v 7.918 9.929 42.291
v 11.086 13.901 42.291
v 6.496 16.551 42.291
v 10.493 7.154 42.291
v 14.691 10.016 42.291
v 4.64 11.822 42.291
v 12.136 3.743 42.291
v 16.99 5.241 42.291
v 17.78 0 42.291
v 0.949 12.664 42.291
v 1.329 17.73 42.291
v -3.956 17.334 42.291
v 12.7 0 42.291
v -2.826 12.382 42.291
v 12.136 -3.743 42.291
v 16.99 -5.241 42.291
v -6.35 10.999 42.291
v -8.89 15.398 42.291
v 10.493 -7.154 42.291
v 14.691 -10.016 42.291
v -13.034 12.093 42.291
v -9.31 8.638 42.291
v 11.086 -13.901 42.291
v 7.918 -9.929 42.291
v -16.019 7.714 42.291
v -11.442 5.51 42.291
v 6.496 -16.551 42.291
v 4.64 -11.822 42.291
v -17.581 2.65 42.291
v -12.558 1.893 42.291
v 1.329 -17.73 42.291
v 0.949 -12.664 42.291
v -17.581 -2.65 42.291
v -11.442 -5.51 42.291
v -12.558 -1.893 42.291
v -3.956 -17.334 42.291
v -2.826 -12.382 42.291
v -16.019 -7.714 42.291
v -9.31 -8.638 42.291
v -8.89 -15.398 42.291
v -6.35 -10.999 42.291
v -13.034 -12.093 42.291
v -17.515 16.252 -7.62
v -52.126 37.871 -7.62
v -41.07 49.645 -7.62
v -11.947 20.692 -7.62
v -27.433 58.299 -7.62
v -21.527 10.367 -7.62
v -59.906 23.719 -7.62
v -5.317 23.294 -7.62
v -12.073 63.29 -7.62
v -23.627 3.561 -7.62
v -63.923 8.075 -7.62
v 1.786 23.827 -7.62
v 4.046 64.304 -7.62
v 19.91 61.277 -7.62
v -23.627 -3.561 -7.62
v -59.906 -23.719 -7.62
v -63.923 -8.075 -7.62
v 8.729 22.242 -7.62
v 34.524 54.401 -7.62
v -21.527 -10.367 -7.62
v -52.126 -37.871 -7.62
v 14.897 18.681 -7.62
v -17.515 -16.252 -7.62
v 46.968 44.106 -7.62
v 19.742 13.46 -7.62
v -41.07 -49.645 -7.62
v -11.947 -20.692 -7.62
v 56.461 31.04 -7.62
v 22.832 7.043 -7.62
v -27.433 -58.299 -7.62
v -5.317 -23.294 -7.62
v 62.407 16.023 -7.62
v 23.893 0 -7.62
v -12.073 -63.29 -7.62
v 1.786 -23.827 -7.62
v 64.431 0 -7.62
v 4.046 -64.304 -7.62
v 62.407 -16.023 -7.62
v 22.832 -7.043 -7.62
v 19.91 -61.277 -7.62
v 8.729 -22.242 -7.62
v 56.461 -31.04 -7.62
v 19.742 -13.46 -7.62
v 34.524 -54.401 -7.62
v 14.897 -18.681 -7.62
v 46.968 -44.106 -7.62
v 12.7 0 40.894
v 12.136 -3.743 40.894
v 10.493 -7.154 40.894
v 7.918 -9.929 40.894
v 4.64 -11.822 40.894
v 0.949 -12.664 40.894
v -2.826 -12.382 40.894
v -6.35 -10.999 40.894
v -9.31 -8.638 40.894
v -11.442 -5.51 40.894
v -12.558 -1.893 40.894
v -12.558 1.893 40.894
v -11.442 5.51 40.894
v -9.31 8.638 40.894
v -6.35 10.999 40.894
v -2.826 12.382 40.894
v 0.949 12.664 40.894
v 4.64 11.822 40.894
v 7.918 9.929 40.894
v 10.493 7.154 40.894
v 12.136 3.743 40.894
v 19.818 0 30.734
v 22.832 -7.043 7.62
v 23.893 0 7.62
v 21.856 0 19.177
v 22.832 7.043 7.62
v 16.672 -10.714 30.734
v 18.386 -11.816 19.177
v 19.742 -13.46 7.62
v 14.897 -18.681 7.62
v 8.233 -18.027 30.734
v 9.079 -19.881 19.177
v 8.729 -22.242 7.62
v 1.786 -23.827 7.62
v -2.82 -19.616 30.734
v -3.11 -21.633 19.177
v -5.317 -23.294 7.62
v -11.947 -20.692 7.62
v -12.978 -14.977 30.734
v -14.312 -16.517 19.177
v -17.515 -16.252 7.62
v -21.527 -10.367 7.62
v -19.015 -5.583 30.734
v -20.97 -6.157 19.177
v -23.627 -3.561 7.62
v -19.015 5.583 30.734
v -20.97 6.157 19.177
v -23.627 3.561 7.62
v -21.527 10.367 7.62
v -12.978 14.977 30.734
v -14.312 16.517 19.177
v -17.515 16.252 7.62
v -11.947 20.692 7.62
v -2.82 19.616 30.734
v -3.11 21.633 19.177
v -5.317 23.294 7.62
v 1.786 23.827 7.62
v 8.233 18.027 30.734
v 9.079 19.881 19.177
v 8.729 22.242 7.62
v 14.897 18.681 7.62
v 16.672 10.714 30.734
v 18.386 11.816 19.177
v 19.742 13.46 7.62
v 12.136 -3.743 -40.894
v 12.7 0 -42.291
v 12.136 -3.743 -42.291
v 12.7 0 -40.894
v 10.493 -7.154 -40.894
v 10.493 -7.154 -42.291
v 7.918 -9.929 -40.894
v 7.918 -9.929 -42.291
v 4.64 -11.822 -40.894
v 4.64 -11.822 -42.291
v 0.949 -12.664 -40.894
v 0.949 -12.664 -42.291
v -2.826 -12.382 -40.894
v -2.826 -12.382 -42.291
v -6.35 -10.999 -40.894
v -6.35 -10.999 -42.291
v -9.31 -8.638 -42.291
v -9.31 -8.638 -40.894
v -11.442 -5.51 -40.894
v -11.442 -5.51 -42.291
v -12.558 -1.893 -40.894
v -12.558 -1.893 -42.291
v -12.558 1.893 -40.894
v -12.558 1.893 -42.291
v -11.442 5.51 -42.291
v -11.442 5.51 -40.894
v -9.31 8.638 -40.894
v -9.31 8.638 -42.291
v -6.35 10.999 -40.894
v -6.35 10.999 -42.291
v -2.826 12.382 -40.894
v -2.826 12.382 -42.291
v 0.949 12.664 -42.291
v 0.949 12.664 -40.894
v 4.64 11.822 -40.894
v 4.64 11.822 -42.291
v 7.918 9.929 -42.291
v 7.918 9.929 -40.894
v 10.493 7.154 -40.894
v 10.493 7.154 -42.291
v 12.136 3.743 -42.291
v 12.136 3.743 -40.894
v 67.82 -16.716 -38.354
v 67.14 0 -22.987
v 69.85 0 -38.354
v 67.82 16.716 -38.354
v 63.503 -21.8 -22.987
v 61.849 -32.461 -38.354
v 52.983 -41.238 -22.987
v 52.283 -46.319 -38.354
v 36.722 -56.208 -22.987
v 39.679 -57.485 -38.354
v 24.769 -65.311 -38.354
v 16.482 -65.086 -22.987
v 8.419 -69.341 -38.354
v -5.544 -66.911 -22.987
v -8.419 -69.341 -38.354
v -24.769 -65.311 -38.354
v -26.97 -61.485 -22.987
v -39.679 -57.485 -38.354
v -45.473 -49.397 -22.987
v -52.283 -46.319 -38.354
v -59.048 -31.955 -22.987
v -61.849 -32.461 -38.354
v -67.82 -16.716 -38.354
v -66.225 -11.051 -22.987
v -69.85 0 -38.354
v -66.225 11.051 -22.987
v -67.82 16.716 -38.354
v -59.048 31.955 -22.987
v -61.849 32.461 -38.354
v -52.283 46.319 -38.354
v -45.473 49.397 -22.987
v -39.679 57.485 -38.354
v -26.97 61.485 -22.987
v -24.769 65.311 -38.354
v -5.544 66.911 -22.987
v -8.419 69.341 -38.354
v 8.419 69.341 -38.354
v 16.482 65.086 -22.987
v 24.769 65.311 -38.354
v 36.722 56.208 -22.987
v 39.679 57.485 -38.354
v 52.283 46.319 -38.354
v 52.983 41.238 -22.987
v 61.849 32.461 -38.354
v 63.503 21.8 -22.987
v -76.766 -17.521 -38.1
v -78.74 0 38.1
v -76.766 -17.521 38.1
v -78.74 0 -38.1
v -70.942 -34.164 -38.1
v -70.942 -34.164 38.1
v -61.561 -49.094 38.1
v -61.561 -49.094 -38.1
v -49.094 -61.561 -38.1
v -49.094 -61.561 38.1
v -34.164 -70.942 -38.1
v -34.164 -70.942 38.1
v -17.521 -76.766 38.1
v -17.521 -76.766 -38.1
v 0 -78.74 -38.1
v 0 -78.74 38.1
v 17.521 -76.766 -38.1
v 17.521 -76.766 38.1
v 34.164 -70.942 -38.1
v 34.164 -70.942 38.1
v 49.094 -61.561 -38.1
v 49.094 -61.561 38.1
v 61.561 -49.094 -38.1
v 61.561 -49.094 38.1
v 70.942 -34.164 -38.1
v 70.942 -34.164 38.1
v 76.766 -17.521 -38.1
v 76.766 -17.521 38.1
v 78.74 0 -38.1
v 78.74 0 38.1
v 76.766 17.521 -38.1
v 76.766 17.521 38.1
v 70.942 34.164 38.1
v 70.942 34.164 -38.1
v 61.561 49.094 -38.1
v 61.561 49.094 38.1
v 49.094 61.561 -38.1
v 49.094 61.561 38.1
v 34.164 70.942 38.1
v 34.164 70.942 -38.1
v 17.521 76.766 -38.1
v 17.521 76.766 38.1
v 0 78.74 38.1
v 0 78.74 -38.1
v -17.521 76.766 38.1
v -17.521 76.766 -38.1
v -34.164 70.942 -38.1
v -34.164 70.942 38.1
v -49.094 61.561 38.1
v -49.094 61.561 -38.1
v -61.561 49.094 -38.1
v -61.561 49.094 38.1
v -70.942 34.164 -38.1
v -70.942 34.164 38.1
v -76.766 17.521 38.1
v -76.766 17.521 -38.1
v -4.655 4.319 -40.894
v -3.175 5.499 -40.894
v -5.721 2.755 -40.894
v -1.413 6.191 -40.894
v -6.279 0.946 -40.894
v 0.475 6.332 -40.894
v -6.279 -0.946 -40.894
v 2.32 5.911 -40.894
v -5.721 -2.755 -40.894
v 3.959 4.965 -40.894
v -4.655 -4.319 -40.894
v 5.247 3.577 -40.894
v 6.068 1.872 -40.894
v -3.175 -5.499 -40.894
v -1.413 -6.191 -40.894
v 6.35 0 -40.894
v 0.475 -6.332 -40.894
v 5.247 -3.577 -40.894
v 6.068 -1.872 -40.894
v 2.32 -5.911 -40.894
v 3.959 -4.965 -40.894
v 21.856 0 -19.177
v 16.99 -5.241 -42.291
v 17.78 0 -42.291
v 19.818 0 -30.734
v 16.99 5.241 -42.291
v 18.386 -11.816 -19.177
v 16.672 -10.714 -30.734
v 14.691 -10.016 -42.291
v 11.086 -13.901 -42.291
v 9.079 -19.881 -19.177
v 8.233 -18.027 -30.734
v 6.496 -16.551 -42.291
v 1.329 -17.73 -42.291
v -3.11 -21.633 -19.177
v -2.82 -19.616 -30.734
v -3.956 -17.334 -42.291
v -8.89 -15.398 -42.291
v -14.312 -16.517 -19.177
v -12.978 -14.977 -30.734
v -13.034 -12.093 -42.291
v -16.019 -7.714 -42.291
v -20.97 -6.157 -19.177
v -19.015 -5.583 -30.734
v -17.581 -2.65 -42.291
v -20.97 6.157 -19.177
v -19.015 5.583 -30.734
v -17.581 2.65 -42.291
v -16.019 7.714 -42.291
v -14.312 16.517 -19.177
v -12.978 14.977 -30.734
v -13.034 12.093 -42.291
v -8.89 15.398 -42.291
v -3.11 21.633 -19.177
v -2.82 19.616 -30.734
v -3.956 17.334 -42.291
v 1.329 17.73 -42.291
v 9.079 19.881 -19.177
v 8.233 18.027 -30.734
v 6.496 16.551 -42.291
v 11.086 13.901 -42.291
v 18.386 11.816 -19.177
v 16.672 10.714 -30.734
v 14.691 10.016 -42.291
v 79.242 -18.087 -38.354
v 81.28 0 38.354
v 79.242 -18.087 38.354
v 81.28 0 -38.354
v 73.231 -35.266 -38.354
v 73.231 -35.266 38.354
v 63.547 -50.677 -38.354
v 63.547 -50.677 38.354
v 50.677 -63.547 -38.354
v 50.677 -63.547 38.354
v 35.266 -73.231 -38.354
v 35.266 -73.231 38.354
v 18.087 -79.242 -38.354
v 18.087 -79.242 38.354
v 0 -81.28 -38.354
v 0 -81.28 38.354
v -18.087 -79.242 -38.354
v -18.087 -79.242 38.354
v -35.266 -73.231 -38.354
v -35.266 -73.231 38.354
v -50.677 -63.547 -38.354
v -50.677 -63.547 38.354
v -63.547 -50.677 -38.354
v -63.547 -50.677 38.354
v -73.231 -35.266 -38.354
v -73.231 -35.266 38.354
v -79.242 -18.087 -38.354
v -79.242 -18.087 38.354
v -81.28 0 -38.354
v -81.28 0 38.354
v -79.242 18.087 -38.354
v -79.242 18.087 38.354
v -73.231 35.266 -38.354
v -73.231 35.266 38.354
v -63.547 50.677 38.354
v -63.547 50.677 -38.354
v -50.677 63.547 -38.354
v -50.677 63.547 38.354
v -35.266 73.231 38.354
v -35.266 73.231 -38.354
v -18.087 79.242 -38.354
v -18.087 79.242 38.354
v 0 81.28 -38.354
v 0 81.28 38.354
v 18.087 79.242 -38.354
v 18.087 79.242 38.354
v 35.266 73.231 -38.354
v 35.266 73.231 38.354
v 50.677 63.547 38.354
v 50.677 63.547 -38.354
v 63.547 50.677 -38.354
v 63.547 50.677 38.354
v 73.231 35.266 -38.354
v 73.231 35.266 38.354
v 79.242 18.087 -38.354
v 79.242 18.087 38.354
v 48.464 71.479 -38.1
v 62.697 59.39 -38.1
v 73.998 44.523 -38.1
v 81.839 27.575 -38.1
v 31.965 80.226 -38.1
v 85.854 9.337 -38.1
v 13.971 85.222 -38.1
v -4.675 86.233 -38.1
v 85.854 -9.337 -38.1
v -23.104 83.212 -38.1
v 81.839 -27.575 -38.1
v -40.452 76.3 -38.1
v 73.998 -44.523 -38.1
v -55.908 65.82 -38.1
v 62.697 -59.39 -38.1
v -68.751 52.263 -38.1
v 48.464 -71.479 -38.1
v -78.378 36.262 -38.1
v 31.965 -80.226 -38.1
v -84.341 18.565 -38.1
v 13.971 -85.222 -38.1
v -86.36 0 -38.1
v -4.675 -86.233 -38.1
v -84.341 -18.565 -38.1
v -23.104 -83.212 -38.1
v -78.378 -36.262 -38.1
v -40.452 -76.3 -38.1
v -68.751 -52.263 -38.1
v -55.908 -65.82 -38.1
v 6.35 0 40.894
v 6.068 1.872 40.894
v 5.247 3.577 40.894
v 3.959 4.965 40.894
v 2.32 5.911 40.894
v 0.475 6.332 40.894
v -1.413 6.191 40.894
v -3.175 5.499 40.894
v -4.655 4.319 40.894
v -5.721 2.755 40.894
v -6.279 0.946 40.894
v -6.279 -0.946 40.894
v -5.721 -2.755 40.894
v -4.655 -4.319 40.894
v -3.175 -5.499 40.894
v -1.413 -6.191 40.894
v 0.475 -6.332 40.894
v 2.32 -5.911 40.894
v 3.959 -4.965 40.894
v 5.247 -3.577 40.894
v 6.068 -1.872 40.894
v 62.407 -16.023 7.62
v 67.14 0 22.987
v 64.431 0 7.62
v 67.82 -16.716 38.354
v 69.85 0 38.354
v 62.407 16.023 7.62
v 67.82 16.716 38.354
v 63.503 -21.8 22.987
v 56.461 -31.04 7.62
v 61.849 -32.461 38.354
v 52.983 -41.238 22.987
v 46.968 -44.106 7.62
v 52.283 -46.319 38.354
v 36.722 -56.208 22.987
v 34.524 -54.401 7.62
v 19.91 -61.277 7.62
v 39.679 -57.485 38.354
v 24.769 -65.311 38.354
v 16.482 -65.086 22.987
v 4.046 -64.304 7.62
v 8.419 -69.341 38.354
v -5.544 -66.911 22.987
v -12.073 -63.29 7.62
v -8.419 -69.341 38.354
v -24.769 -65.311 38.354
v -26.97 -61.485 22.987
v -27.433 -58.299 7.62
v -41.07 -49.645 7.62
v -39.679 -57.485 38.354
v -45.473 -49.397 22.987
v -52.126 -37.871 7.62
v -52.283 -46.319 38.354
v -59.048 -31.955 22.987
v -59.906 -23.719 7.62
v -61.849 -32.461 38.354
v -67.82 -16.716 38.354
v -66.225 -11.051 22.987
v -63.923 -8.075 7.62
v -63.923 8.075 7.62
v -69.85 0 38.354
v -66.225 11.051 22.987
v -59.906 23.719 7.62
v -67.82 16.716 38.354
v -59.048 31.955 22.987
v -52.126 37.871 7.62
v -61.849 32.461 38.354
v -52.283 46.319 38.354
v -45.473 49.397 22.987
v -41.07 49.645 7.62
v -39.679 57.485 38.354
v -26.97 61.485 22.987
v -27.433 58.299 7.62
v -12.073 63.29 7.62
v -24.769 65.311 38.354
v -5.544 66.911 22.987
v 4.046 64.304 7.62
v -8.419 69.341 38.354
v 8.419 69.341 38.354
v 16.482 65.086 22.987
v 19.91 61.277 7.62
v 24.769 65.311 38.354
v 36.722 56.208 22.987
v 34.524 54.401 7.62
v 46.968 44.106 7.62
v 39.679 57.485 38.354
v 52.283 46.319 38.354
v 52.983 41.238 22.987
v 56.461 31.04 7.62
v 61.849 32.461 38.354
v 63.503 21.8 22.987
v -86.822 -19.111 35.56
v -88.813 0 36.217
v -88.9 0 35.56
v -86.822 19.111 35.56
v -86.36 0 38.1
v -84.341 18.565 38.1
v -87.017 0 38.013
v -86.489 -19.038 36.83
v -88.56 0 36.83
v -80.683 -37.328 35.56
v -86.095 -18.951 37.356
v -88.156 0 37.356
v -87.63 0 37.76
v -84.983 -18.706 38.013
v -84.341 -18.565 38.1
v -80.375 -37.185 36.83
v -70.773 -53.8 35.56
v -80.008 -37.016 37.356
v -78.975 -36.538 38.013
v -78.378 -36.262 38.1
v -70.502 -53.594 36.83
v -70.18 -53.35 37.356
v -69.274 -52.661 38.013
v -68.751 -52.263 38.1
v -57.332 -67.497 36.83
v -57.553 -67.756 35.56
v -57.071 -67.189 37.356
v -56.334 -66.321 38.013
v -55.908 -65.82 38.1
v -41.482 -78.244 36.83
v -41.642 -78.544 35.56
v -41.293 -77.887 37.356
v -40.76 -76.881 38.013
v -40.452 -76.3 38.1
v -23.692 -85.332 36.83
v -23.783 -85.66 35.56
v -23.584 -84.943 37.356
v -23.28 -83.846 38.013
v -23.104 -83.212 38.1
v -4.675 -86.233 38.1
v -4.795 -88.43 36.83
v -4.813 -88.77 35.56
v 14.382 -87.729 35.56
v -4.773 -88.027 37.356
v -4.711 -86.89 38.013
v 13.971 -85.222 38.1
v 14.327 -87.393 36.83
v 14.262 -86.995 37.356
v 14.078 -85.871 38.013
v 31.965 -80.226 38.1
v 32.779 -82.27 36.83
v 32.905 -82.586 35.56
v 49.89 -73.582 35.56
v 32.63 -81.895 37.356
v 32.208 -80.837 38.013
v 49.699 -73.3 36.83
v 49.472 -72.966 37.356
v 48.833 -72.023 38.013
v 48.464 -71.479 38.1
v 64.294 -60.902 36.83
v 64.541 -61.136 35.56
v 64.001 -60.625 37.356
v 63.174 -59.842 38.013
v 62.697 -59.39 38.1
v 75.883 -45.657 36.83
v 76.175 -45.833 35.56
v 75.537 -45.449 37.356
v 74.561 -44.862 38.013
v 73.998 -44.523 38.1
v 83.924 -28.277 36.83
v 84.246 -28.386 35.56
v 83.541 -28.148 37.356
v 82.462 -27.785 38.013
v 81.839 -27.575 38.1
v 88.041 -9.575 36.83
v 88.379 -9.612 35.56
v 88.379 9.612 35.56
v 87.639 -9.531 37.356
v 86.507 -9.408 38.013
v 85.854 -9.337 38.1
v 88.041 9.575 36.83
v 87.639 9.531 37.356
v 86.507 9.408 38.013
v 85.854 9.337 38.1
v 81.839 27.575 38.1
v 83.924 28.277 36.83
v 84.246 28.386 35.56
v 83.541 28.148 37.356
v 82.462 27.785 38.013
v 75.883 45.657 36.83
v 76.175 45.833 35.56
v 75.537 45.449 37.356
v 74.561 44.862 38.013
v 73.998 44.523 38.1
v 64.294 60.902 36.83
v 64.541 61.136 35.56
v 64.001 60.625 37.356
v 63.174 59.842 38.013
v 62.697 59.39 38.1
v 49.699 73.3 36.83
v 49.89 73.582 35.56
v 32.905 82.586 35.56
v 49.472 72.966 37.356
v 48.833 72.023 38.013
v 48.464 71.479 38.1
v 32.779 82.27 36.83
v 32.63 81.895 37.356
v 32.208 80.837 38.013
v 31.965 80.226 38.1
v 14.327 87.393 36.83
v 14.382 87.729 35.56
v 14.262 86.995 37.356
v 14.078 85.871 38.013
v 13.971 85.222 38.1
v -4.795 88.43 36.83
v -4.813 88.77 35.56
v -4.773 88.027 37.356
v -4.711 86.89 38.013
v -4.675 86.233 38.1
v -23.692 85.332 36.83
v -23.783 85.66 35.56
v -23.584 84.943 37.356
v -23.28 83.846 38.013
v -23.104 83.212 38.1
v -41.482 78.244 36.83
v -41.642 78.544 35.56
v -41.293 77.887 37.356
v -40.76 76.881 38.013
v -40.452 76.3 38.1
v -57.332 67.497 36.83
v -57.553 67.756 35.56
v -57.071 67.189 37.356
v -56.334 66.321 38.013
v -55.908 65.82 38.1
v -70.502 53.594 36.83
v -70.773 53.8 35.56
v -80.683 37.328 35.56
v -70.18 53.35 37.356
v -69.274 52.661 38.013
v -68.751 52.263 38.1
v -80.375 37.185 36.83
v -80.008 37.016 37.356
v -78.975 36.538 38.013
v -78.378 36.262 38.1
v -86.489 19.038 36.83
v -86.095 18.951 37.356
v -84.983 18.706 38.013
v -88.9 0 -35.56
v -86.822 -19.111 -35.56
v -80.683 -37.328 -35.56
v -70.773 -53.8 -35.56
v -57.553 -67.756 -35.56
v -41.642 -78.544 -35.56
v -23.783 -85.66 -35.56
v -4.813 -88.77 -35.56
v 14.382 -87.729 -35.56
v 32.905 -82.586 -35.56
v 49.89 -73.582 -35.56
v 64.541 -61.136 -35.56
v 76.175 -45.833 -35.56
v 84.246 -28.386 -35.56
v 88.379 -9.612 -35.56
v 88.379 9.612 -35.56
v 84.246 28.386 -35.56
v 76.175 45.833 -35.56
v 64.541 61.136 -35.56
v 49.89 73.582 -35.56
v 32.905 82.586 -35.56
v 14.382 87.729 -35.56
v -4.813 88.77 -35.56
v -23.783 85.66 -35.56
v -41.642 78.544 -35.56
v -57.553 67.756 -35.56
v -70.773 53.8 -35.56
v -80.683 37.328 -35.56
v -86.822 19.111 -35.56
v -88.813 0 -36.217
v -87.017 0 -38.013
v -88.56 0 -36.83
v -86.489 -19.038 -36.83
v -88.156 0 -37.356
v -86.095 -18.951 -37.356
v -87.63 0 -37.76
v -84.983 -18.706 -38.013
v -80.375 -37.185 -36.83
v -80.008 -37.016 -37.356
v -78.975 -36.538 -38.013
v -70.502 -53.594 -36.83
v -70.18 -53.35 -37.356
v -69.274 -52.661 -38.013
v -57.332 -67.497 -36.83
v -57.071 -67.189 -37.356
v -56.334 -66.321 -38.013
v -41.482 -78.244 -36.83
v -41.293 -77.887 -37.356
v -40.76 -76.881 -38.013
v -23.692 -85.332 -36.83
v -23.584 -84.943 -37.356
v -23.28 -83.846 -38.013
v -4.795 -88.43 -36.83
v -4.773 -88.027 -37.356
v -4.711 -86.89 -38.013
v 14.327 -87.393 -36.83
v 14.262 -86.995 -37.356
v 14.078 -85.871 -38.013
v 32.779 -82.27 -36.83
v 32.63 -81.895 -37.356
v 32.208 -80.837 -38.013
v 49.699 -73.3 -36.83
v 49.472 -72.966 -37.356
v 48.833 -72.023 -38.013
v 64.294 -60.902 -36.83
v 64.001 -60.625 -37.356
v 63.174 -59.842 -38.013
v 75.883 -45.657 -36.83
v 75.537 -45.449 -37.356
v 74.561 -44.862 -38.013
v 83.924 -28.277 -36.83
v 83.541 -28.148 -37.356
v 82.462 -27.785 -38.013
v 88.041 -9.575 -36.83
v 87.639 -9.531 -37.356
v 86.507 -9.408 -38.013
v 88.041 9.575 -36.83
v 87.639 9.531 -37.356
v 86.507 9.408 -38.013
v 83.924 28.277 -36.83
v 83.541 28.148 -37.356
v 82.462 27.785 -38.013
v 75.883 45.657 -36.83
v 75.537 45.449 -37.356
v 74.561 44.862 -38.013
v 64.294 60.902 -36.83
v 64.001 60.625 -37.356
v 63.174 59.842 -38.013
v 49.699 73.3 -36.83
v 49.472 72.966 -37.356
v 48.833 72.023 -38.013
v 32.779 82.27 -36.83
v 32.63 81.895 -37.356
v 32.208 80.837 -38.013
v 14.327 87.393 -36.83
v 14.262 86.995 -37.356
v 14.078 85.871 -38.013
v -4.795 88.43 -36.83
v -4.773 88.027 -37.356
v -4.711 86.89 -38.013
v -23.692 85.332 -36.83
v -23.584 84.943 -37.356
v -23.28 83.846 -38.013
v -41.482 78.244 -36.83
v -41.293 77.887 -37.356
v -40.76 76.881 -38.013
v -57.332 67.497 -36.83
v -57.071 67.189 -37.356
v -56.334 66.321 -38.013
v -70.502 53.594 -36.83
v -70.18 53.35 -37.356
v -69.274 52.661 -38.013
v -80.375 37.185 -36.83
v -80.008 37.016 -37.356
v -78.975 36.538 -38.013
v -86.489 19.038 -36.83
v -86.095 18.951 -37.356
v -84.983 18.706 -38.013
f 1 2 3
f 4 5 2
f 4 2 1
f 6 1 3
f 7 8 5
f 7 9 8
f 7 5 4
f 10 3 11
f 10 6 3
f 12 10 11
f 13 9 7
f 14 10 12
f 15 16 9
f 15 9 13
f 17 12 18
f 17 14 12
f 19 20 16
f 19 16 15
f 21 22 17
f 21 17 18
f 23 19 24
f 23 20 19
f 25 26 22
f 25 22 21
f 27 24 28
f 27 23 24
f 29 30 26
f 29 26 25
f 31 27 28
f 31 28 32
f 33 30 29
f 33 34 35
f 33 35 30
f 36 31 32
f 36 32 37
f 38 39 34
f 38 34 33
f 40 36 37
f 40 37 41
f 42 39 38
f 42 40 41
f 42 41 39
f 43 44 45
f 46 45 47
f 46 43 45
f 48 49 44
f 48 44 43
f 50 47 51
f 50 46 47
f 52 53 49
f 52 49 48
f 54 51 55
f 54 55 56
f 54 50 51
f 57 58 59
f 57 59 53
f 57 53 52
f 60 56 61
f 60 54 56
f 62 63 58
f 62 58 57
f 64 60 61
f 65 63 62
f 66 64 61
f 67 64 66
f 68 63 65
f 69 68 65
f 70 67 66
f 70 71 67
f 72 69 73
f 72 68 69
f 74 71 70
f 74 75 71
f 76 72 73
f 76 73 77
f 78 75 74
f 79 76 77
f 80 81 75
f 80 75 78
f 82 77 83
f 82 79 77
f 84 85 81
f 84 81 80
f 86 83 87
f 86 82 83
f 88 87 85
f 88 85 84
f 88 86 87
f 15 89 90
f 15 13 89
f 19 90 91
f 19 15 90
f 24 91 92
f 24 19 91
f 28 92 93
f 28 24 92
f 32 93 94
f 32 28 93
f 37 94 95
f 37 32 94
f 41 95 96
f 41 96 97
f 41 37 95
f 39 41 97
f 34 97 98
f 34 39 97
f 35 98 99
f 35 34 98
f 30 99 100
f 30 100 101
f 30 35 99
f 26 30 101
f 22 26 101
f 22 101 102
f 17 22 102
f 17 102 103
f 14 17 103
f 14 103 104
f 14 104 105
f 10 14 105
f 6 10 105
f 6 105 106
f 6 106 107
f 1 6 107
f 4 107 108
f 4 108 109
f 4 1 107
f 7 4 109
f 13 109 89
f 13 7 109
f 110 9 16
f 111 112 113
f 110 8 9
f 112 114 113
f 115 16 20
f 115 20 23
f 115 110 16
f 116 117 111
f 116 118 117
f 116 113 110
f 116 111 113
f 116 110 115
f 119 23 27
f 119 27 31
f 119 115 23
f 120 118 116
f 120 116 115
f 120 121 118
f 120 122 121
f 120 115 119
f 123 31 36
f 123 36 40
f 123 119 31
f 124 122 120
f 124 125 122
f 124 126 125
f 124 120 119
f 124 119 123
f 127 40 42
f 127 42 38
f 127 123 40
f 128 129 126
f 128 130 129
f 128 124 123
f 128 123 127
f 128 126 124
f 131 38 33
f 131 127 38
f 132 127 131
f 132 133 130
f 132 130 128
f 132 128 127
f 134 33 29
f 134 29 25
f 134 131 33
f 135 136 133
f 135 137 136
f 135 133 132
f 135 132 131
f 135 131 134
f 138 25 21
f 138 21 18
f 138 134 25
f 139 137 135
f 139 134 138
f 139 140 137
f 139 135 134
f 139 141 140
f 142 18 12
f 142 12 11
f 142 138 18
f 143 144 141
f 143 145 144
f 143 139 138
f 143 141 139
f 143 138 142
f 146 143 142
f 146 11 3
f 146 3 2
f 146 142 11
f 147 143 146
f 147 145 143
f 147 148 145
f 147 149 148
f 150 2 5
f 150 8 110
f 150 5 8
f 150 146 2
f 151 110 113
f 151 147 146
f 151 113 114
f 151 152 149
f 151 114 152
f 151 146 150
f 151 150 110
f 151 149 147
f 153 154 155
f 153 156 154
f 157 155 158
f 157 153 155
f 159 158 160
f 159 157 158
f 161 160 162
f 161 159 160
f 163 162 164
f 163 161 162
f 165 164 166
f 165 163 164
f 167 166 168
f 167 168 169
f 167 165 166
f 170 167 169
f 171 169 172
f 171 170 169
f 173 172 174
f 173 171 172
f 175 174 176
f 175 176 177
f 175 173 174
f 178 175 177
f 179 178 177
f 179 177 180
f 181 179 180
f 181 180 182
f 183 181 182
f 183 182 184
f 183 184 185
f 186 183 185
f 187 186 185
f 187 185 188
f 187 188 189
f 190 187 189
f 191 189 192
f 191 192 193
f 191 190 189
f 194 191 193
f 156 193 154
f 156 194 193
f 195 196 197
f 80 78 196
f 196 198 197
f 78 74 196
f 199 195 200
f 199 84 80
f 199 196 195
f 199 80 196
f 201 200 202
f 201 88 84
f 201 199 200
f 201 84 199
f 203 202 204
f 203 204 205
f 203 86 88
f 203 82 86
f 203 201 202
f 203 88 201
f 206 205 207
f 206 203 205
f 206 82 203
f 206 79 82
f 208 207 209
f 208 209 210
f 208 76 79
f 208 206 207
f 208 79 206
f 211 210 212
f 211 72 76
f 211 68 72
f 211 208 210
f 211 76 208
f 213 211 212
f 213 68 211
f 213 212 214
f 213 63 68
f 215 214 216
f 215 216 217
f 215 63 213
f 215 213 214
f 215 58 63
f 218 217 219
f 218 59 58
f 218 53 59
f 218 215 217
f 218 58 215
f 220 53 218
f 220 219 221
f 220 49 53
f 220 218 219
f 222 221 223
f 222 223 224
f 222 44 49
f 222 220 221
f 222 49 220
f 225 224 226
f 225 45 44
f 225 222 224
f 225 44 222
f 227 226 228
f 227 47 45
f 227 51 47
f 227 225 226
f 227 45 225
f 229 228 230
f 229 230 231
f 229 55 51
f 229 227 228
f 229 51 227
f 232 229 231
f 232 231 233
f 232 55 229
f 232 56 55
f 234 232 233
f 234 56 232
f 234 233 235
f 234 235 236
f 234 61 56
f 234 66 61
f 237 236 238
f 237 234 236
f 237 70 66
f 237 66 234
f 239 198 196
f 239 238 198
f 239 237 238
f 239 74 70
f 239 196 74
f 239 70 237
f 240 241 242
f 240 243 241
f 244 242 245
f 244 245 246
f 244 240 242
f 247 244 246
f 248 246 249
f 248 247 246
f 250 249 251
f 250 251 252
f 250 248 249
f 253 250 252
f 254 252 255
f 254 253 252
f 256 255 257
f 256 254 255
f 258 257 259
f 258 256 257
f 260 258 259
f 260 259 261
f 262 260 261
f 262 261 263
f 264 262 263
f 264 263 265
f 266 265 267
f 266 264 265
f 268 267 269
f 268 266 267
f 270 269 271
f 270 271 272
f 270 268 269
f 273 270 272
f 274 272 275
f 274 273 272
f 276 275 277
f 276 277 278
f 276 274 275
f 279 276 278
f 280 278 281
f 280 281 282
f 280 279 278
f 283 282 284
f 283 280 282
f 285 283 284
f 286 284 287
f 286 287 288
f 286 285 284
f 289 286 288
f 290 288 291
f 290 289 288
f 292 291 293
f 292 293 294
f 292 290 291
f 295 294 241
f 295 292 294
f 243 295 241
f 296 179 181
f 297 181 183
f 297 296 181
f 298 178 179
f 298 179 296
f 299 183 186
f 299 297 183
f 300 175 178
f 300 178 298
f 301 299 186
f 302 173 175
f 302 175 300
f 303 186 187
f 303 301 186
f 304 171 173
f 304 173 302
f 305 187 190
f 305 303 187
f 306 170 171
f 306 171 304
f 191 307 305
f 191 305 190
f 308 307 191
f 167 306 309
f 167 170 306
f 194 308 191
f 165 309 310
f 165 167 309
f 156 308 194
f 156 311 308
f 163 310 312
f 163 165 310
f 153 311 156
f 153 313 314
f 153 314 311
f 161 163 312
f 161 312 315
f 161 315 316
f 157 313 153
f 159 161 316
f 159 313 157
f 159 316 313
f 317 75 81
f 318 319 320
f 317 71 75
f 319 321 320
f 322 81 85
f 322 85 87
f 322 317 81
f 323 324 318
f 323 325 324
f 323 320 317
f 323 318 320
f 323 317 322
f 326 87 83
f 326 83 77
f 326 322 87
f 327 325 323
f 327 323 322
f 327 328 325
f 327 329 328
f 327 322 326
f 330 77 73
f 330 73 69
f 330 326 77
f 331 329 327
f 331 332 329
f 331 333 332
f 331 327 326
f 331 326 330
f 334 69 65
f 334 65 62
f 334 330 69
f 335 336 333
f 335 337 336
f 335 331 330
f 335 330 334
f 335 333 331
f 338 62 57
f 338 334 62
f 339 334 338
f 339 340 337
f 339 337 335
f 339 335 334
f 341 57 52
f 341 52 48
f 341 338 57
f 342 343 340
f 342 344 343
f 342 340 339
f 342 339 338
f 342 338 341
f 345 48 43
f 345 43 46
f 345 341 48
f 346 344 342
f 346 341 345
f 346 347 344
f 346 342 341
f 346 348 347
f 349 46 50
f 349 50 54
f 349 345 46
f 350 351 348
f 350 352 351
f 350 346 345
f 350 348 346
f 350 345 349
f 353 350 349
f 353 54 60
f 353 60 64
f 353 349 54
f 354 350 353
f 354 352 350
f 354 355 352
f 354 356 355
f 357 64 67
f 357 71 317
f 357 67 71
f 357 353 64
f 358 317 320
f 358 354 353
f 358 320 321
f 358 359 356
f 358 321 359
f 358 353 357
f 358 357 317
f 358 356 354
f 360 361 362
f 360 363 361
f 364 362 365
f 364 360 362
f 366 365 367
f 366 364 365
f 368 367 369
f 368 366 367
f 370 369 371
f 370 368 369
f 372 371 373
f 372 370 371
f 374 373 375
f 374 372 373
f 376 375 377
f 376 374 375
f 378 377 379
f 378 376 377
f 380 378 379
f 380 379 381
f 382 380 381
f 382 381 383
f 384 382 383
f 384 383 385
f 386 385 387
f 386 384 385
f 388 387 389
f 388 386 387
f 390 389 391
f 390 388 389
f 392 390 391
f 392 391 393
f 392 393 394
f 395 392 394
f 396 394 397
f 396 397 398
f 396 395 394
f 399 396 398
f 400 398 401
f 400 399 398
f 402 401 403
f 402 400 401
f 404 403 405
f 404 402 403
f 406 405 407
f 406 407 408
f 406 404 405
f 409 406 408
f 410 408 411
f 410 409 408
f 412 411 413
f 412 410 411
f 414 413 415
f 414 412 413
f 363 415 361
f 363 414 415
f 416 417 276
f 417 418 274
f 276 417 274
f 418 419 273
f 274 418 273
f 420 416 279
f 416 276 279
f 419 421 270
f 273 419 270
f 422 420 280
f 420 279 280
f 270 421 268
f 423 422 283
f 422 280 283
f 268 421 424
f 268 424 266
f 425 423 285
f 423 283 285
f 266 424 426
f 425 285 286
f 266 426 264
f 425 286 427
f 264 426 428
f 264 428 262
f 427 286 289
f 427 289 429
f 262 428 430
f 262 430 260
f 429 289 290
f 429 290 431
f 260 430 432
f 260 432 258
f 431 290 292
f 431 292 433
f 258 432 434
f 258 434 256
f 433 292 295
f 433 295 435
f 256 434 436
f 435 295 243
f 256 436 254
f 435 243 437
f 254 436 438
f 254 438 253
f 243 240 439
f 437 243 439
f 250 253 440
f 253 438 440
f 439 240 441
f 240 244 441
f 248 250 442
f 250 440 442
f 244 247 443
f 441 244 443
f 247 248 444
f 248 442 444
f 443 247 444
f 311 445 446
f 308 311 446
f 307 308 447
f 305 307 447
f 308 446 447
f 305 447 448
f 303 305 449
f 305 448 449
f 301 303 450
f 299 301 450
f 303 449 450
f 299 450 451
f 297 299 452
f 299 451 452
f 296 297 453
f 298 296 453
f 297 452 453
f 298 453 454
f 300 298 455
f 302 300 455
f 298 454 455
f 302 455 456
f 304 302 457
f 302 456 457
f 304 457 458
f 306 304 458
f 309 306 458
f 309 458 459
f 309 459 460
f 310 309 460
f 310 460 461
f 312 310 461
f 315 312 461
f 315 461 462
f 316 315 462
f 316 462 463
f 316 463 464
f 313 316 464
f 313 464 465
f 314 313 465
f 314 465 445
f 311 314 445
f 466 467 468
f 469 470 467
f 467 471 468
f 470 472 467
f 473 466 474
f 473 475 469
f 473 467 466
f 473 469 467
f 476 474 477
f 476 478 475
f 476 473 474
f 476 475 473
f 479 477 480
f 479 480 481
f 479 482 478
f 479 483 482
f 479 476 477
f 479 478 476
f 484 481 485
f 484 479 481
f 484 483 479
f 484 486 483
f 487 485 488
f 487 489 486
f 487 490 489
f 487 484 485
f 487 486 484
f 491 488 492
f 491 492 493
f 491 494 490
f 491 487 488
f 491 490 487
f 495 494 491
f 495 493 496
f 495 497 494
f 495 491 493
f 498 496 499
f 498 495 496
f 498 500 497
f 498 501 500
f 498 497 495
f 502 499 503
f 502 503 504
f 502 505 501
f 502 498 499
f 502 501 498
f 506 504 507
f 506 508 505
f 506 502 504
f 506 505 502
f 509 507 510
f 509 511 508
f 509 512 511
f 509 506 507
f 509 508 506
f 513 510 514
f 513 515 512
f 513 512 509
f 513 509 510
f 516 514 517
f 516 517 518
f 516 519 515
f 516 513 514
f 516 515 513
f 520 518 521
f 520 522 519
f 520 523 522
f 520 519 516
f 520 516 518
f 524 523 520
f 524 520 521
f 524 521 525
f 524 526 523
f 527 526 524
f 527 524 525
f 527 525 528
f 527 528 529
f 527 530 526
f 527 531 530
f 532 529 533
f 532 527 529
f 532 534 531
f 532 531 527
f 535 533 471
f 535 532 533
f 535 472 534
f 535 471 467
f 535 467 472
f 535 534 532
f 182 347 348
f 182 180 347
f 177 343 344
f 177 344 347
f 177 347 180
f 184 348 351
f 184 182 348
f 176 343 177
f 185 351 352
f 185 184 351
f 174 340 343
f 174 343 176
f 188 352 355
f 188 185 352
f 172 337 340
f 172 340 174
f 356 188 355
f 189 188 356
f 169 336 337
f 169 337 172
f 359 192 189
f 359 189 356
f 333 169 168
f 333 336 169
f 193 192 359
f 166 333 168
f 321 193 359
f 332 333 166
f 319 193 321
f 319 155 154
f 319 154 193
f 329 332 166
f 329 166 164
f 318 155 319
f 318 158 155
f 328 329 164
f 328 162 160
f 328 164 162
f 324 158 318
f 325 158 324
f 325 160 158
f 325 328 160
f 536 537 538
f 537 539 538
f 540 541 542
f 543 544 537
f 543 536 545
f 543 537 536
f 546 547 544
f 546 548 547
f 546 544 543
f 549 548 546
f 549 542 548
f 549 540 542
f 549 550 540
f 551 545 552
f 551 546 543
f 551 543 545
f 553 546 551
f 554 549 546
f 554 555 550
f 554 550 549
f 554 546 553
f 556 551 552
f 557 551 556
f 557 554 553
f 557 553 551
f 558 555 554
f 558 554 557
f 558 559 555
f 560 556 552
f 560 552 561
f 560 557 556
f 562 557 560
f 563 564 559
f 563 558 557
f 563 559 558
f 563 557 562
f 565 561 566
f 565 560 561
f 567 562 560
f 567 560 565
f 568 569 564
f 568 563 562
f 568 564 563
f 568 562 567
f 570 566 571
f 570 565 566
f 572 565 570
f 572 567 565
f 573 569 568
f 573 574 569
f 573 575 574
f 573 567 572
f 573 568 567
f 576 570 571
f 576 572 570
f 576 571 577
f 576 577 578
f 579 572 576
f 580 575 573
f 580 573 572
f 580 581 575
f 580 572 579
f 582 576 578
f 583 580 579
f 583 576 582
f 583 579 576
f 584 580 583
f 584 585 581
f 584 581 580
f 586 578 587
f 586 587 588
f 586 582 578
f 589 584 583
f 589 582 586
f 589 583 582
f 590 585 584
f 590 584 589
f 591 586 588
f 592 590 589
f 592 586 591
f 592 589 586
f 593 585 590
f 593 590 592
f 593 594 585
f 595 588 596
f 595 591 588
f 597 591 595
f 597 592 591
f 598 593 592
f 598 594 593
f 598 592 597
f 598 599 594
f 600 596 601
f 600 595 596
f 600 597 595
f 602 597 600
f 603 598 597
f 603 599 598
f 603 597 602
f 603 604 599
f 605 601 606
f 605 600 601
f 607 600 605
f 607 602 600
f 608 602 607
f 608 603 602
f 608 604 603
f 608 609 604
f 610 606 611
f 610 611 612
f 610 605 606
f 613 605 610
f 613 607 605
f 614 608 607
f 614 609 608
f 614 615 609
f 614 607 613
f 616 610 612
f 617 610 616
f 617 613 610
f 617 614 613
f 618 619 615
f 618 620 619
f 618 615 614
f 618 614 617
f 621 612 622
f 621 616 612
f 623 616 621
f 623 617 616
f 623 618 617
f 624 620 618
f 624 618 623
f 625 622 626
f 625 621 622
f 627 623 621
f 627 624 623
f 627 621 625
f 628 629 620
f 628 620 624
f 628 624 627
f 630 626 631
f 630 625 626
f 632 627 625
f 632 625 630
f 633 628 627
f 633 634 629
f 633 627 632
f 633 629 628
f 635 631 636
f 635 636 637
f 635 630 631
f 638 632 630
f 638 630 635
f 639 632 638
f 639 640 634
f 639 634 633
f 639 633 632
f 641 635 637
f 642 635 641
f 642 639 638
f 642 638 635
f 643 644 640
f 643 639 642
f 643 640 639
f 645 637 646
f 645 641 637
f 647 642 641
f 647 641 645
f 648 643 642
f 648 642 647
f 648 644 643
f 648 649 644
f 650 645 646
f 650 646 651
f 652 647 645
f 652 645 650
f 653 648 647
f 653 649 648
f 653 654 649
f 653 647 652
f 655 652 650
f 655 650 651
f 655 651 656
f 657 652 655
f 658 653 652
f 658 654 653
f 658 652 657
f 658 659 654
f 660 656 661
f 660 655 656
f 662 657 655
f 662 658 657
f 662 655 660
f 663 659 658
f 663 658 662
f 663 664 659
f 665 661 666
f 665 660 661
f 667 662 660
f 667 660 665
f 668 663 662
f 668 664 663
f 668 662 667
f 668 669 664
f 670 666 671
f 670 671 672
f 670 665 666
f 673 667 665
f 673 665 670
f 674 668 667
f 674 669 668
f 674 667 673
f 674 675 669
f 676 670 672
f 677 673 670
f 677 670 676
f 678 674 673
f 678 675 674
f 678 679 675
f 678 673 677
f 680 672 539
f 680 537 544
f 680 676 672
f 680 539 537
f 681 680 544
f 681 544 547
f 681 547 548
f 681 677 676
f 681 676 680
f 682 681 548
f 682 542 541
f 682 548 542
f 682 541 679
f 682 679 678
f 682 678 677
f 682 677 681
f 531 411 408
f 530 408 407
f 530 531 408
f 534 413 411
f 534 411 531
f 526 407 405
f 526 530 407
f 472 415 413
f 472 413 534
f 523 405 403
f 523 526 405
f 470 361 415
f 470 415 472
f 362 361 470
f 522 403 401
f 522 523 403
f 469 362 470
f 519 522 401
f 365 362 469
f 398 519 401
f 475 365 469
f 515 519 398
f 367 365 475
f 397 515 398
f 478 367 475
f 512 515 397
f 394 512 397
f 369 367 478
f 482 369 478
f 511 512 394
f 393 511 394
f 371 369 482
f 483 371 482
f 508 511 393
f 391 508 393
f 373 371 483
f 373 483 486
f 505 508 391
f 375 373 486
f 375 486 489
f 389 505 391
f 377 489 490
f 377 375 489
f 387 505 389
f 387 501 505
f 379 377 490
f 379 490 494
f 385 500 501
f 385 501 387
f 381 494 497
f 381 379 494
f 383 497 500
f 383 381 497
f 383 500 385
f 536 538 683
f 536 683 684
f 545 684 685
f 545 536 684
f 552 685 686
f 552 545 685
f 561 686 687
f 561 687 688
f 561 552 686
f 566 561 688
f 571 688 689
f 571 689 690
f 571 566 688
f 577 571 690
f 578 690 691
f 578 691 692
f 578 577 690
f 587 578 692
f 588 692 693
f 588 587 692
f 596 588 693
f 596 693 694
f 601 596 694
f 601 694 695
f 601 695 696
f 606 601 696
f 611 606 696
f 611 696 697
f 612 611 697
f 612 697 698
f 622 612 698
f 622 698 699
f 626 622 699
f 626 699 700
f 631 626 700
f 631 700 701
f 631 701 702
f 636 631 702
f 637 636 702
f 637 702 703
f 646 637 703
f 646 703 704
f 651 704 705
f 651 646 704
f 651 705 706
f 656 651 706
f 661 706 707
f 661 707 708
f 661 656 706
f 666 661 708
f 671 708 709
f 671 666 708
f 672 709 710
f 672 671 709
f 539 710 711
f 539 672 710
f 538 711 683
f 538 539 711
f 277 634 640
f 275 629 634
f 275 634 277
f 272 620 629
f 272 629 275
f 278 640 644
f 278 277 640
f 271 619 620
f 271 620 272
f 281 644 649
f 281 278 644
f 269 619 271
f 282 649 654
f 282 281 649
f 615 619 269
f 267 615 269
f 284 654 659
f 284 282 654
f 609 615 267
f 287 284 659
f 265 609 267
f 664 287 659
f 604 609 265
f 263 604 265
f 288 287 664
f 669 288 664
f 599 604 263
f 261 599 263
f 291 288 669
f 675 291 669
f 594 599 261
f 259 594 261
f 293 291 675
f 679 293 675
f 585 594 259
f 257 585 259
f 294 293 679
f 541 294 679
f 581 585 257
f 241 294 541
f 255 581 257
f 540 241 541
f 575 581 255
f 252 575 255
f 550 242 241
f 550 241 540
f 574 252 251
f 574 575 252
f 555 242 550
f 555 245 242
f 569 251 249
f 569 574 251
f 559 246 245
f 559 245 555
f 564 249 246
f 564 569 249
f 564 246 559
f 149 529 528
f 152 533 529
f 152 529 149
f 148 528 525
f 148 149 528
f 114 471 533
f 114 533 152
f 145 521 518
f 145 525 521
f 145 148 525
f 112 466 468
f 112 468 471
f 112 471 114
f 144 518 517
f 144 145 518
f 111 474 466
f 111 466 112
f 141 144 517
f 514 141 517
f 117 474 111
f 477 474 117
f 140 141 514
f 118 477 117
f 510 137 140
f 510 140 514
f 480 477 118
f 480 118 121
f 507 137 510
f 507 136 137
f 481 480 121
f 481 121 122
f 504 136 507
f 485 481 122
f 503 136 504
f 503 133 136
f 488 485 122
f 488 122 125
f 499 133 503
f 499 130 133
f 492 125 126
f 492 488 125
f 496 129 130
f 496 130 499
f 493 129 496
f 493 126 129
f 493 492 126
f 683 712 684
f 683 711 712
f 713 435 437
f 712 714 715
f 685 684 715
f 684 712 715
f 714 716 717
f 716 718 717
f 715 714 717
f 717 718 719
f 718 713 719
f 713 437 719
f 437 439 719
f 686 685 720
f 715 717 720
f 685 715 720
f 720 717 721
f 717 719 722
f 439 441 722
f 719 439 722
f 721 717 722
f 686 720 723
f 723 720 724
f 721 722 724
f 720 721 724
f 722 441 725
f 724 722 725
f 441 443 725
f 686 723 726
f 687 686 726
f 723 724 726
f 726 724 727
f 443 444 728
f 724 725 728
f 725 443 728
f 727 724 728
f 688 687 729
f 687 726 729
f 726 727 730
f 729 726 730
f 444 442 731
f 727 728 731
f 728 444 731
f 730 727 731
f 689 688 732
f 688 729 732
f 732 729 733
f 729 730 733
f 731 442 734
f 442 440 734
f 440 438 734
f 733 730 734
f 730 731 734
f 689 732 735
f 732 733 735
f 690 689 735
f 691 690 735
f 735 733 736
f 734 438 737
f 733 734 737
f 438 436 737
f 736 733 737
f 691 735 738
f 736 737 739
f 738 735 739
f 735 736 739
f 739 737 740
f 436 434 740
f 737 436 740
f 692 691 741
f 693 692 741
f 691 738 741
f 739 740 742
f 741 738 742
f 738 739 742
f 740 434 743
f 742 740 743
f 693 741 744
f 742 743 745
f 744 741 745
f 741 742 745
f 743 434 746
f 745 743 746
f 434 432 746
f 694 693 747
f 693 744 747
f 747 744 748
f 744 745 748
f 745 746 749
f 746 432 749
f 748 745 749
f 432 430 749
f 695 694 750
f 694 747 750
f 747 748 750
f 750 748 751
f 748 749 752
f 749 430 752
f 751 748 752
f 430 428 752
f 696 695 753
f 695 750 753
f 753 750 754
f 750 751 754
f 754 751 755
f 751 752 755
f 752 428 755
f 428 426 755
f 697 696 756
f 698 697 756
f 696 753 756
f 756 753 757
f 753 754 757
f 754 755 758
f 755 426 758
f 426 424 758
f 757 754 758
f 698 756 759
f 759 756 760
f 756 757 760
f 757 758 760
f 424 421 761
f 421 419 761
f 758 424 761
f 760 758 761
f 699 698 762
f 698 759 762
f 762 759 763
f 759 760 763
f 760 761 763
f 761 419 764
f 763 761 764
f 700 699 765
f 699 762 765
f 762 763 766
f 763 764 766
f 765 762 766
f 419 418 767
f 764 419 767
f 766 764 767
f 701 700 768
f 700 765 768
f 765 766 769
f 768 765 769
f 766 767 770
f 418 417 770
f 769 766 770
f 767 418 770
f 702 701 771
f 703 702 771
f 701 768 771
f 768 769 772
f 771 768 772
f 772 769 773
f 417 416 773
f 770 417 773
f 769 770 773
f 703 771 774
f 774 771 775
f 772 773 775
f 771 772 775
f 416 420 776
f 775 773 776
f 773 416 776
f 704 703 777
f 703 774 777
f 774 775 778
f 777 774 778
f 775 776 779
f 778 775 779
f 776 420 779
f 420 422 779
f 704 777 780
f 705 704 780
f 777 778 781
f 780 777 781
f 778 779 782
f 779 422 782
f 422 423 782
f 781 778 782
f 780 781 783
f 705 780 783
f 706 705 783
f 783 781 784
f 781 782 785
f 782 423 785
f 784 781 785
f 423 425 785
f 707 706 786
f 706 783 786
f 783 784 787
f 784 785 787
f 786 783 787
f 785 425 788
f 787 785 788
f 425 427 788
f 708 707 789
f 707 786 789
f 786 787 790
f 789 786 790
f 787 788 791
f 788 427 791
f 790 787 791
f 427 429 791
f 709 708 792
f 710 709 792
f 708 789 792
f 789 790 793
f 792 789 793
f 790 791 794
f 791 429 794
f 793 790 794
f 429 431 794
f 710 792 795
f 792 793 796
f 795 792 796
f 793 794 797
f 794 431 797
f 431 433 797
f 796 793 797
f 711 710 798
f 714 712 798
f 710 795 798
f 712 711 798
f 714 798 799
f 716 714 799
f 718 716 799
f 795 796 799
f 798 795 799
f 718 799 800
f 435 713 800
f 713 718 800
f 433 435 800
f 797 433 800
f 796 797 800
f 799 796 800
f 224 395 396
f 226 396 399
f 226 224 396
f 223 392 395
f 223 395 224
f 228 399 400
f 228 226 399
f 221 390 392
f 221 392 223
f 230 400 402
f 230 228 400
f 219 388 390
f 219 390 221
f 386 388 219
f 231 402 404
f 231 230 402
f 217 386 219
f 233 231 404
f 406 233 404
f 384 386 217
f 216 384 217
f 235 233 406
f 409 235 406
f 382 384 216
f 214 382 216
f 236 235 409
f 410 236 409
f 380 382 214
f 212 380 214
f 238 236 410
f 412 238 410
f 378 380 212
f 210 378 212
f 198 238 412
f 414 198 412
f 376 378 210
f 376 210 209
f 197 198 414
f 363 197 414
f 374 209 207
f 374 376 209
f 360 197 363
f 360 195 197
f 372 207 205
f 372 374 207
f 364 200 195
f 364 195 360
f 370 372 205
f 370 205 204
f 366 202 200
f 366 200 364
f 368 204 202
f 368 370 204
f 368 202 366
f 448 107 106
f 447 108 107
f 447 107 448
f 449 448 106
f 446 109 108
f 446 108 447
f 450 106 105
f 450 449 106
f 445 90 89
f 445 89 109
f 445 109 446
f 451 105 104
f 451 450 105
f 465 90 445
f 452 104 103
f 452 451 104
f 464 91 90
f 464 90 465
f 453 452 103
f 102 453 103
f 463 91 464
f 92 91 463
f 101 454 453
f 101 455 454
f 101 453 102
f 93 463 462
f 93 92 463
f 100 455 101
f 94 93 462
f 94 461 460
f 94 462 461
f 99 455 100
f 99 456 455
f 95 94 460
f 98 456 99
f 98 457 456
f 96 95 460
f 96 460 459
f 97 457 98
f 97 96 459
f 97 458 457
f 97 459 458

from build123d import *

# Parameters (mm, degrees)
SKETCH1_R           = 88.9
SKETCH1_R_2         = 78.74
BOSS_EXTRUDE1_DEPTH = 38.1
FILLET1_R           = 2.54
SKETCH8_R           = 6.35
CUT_EXTRUDE1_DEPTH  = 151.751995817


with BuildPart() as part:
    # Sketch1 → Boss-Extrude1 (new, symmetric)
    with BuildSketch(Plane.XY):
        with Locations(Location((0, 0, 0), (0, 0, 180))):
            Circle(SKETCH1_R)
        with Locations(Location((0, 0, 0), (0, 0, 180))):
            Circle(SKETCH1_R_2, mode=Mode.SUBTRACT)
    extrude(amount=BOSS_EXTRUDE1_DEPTH, both=True)

    # Fillet1
    fillet1_edges = [part.edges().sort_by_distance(p)[0] for p in [
        (88.9, 0, -38.1),
        (88.9, 0, 38.1),
    ]]
    fillet(fillet1_edges, radius=FILLET1_R)


with BuildPart() as body_2:
    # Sketch3 → Revolve1 (revolve)
    with BuildSketch(Plane(origin=(0, 0, 0), x_dir=(1, 0, 0), z_dir=(0, 1, 0)), mode=Mode.PRIVATE) as revolve1_sk:
        Polygon((0, 40.894), (0, -40.894), (-12.7, -40.894), (-12.7, -42.291), (-17.78, -42.291), (-23.893432748, -7.62), (-64.430766575, -7.62), (-69.85, -38.354), (-81.28, -38.354), (-81.28, 38.354), (-69.85, 38.354), (-64.430766575, 7.62), (-23.893432748, 7.62), (-17.78, 42.291), (-12.7, 42.291), (-12.7, 40.894), align=None)
    revolve(revolve1_sk.sketch.rotate(Axis((0, 0, 0), (0, 0, -1)), 180), axis=Axis((0, 0, 0), (0, 0, -1)))

    # Sketch8 → Cut-Extrude1 (cut, through all)
    with BuildSketch(Plane.XY.offset(40.894)):
        Circle(SKETCH8_R)
    extrude(amount=-CUT_EXTRUDE1_DEPTH, mode=Mode.SUBTRACT)


solid = Compound([part.part, body_2.part])
